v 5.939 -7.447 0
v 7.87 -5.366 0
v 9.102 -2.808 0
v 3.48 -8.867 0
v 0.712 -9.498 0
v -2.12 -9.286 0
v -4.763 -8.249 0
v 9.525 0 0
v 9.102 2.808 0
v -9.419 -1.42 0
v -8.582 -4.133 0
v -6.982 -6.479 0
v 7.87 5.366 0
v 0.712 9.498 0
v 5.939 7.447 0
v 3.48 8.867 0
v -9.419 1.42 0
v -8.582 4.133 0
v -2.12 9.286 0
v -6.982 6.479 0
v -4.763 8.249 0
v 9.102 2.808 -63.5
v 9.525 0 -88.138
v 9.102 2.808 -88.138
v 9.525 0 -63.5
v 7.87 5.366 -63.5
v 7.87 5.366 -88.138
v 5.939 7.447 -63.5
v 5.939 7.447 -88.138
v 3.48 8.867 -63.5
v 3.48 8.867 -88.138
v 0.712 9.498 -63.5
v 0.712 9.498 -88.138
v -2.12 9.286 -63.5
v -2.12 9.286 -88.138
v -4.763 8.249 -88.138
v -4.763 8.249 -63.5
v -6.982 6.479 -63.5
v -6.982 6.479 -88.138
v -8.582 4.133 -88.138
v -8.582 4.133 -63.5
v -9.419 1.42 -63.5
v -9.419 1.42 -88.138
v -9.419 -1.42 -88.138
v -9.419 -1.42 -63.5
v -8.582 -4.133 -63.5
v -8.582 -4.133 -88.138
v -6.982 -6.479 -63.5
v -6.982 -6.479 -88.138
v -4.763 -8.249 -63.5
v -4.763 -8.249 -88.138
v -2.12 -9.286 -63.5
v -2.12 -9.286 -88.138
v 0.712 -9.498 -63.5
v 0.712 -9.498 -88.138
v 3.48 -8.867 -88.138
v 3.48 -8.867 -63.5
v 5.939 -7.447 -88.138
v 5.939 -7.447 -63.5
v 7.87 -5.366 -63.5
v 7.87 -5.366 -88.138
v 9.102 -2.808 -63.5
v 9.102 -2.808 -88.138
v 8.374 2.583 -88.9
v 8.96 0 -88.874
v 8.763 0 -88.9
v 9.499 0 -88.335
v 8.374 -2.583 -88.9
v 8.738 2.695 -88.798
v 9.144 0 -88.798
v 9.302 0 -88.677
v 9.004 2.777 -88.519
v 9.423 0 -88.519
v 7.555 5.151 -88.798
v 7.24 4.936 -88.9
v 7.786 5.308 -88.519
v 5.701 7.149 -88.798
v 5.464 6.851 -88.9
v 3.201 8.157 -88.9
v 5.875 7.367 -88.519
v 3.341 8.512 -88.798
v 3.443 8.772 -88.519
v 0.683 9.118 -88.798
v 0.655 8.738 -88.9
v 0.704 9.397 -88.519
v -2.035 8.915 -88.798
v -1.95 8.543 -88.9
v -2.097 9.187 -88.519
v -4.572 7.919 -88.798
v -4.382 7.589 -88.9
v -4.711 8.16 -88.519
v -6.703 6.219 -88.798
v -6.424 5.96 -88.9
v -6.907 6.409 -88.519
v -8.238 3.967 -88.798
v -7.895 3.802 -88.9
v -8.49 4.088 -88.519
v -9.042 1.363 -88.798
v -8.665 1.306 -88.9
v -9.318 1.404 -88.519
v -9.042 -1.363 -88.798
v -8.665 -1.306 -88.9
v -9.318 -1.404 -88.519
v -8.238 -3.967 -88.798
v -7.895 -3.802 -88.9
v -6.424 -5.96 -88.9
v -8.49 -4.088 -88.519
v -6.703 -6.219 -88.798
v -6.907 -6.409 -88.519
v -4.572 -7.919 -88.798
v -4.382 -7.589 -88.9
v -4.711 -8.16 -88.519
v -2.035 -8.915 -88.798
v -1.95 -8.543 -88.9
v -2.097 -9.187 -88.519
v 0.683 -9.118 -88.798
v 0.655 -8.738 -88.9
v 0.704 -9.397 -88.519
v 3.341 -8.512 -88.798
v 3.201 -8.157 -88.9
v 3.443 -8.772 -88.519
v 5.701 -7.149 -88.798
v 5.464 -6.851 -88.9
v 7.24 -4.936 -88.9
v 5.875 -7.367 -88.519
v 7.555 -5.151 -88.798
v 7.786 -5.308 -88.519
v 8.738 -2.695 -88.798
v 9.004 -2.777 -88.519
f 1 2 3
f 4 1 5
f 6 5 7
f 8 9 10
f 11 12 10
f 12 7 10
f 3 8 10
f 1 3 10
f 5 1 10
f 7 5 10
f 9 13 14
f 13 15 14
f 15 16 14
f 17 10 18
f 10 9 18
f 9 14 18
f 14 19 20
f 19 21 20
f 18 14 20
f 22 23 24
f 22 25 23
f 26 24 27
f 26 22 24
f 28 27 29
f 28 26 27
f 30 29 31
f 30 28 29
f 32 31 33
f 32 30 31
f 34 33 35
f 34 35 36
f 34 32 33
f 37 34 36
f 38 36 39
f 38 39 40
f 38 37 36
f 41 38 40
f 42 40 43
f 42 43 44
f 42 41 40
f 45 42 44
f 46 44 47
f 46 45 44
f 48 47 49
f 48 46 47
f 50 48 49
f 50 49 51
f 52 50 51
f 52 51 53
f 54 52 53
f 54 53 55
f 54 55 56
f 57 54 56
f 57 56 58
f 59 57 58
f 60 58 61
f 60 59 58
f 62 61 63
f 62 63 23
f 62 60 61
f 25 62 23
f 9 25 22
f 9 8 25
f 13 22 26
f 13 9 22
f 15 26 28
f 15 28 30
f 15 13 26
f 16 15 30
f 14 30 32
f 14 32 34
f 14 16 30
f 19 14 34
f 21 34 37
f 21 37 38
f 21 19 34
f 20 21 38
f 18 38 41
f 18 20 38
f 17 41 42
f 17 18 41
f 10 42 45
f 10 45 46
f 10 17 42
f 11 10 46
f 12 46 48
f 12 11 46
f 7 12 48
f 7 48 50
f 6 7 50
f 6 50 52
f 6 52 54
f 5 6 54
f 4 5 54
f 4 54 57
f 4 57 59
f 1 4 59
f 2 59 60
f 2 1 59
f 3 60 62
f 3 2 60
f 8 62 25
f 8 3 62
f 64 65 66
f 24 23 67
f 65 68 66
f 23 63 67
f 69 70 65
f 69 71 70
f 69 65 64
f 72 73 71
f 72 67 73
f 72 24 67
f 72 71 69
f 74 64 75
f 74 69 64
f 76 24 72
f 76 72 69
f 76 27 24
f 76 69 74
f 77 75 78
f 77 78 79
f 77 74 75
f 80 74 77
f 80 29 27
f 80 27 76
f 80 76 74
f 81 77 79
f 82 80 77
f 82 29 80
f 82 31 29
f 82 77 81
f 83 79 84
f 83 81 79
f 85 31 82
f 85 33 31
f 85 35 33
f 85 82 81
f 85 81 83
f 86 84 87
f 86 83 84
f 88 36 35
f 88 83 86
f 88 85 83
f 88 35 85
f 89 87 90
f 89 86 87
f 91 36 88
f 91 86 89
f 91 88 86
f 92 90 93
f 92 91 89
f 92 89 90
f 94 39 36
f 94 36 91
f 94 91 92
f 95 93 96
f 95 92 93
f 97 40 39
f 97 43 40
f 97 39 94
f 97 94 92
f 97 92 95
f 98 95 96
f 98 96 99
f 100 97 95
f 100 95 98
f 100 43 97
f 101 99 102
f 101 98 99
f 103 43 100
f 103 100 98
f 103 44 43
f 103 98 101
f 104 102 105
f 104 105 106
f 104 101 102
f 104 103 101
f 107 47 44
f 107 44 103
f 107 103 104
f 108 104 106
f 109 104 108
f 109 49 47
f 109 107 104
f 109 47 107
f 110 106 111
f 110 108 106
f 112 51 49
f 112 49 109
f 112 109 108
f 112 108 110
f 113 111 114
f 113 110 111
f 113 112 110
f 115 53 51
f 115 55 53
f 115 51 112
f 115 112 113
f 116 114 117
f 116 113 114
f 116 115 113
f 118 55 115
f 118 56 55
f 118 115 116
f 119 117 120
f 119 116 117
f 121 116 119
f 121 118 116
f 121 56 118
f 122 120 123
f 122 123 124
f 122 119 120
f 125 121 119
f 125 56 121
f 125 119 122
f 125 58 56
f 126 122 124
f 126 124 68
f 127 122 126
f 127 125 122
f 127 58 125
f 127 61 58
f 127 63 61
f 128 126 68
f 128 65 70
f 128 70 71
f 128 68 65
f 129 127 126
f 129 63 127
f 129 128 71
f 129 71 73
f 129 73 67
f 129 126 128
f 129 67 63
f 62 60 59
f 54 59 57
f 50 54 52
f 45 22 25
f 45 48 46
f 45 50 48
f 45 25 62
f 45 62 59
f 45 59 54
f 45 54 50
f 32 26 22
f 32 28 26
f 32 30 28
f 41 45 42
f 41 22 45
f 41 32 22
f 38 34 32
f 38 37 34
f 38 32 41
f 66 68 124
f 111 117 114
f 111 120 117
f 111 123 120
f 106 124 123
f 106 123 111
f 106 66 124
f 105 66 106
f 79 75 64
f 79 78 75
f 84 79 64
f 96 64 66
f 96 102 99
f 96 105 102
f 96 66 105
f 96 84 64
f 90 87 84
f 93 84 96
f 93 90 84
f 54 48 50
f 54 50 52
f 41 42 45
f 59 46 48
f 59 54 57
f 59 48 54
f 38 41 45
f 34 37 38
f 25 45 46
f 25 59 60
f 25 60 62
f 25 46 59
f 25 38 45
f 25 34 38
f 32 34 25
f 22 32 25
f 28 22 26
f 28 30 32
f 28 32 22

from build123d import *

# Parameters (mm, degrees)
F0_W = 9.525
F0_H = 63.5


with BuildPart() as f1:
    # F0 (on Front) → F1 (revolve)
    with BuildSketch(Plane.XZ):
        with Locations((4.7625, -31.75)):
            Rectangle(F0_W, F0_H)
    revolve(axis=Axis((0, 0, -44.45), (0, 0, 1)))


with BuildPart() as f2:
    # F0 (on Front) → F2 (revolve)
    with BuildSketch(Plane.XZ):
        with BuildLine():
            Line((9.525, -63.5), (0, -63.5))
            Line((0, -63.5), (0, -88.9))
            Line((0, -88.9), (8.763, -88.9))
            ThreePointArc((8.763, -88.9), (9.301815, -88.676815), (9.525, -88.138))
            Line((9.525, -88.138), (9.525, -63.5))
        make_face()
    revolve(axis=Axis((0, 0, -44.45), (0, 0, 1)))


solid = Compound([f1.part, f2.part])
